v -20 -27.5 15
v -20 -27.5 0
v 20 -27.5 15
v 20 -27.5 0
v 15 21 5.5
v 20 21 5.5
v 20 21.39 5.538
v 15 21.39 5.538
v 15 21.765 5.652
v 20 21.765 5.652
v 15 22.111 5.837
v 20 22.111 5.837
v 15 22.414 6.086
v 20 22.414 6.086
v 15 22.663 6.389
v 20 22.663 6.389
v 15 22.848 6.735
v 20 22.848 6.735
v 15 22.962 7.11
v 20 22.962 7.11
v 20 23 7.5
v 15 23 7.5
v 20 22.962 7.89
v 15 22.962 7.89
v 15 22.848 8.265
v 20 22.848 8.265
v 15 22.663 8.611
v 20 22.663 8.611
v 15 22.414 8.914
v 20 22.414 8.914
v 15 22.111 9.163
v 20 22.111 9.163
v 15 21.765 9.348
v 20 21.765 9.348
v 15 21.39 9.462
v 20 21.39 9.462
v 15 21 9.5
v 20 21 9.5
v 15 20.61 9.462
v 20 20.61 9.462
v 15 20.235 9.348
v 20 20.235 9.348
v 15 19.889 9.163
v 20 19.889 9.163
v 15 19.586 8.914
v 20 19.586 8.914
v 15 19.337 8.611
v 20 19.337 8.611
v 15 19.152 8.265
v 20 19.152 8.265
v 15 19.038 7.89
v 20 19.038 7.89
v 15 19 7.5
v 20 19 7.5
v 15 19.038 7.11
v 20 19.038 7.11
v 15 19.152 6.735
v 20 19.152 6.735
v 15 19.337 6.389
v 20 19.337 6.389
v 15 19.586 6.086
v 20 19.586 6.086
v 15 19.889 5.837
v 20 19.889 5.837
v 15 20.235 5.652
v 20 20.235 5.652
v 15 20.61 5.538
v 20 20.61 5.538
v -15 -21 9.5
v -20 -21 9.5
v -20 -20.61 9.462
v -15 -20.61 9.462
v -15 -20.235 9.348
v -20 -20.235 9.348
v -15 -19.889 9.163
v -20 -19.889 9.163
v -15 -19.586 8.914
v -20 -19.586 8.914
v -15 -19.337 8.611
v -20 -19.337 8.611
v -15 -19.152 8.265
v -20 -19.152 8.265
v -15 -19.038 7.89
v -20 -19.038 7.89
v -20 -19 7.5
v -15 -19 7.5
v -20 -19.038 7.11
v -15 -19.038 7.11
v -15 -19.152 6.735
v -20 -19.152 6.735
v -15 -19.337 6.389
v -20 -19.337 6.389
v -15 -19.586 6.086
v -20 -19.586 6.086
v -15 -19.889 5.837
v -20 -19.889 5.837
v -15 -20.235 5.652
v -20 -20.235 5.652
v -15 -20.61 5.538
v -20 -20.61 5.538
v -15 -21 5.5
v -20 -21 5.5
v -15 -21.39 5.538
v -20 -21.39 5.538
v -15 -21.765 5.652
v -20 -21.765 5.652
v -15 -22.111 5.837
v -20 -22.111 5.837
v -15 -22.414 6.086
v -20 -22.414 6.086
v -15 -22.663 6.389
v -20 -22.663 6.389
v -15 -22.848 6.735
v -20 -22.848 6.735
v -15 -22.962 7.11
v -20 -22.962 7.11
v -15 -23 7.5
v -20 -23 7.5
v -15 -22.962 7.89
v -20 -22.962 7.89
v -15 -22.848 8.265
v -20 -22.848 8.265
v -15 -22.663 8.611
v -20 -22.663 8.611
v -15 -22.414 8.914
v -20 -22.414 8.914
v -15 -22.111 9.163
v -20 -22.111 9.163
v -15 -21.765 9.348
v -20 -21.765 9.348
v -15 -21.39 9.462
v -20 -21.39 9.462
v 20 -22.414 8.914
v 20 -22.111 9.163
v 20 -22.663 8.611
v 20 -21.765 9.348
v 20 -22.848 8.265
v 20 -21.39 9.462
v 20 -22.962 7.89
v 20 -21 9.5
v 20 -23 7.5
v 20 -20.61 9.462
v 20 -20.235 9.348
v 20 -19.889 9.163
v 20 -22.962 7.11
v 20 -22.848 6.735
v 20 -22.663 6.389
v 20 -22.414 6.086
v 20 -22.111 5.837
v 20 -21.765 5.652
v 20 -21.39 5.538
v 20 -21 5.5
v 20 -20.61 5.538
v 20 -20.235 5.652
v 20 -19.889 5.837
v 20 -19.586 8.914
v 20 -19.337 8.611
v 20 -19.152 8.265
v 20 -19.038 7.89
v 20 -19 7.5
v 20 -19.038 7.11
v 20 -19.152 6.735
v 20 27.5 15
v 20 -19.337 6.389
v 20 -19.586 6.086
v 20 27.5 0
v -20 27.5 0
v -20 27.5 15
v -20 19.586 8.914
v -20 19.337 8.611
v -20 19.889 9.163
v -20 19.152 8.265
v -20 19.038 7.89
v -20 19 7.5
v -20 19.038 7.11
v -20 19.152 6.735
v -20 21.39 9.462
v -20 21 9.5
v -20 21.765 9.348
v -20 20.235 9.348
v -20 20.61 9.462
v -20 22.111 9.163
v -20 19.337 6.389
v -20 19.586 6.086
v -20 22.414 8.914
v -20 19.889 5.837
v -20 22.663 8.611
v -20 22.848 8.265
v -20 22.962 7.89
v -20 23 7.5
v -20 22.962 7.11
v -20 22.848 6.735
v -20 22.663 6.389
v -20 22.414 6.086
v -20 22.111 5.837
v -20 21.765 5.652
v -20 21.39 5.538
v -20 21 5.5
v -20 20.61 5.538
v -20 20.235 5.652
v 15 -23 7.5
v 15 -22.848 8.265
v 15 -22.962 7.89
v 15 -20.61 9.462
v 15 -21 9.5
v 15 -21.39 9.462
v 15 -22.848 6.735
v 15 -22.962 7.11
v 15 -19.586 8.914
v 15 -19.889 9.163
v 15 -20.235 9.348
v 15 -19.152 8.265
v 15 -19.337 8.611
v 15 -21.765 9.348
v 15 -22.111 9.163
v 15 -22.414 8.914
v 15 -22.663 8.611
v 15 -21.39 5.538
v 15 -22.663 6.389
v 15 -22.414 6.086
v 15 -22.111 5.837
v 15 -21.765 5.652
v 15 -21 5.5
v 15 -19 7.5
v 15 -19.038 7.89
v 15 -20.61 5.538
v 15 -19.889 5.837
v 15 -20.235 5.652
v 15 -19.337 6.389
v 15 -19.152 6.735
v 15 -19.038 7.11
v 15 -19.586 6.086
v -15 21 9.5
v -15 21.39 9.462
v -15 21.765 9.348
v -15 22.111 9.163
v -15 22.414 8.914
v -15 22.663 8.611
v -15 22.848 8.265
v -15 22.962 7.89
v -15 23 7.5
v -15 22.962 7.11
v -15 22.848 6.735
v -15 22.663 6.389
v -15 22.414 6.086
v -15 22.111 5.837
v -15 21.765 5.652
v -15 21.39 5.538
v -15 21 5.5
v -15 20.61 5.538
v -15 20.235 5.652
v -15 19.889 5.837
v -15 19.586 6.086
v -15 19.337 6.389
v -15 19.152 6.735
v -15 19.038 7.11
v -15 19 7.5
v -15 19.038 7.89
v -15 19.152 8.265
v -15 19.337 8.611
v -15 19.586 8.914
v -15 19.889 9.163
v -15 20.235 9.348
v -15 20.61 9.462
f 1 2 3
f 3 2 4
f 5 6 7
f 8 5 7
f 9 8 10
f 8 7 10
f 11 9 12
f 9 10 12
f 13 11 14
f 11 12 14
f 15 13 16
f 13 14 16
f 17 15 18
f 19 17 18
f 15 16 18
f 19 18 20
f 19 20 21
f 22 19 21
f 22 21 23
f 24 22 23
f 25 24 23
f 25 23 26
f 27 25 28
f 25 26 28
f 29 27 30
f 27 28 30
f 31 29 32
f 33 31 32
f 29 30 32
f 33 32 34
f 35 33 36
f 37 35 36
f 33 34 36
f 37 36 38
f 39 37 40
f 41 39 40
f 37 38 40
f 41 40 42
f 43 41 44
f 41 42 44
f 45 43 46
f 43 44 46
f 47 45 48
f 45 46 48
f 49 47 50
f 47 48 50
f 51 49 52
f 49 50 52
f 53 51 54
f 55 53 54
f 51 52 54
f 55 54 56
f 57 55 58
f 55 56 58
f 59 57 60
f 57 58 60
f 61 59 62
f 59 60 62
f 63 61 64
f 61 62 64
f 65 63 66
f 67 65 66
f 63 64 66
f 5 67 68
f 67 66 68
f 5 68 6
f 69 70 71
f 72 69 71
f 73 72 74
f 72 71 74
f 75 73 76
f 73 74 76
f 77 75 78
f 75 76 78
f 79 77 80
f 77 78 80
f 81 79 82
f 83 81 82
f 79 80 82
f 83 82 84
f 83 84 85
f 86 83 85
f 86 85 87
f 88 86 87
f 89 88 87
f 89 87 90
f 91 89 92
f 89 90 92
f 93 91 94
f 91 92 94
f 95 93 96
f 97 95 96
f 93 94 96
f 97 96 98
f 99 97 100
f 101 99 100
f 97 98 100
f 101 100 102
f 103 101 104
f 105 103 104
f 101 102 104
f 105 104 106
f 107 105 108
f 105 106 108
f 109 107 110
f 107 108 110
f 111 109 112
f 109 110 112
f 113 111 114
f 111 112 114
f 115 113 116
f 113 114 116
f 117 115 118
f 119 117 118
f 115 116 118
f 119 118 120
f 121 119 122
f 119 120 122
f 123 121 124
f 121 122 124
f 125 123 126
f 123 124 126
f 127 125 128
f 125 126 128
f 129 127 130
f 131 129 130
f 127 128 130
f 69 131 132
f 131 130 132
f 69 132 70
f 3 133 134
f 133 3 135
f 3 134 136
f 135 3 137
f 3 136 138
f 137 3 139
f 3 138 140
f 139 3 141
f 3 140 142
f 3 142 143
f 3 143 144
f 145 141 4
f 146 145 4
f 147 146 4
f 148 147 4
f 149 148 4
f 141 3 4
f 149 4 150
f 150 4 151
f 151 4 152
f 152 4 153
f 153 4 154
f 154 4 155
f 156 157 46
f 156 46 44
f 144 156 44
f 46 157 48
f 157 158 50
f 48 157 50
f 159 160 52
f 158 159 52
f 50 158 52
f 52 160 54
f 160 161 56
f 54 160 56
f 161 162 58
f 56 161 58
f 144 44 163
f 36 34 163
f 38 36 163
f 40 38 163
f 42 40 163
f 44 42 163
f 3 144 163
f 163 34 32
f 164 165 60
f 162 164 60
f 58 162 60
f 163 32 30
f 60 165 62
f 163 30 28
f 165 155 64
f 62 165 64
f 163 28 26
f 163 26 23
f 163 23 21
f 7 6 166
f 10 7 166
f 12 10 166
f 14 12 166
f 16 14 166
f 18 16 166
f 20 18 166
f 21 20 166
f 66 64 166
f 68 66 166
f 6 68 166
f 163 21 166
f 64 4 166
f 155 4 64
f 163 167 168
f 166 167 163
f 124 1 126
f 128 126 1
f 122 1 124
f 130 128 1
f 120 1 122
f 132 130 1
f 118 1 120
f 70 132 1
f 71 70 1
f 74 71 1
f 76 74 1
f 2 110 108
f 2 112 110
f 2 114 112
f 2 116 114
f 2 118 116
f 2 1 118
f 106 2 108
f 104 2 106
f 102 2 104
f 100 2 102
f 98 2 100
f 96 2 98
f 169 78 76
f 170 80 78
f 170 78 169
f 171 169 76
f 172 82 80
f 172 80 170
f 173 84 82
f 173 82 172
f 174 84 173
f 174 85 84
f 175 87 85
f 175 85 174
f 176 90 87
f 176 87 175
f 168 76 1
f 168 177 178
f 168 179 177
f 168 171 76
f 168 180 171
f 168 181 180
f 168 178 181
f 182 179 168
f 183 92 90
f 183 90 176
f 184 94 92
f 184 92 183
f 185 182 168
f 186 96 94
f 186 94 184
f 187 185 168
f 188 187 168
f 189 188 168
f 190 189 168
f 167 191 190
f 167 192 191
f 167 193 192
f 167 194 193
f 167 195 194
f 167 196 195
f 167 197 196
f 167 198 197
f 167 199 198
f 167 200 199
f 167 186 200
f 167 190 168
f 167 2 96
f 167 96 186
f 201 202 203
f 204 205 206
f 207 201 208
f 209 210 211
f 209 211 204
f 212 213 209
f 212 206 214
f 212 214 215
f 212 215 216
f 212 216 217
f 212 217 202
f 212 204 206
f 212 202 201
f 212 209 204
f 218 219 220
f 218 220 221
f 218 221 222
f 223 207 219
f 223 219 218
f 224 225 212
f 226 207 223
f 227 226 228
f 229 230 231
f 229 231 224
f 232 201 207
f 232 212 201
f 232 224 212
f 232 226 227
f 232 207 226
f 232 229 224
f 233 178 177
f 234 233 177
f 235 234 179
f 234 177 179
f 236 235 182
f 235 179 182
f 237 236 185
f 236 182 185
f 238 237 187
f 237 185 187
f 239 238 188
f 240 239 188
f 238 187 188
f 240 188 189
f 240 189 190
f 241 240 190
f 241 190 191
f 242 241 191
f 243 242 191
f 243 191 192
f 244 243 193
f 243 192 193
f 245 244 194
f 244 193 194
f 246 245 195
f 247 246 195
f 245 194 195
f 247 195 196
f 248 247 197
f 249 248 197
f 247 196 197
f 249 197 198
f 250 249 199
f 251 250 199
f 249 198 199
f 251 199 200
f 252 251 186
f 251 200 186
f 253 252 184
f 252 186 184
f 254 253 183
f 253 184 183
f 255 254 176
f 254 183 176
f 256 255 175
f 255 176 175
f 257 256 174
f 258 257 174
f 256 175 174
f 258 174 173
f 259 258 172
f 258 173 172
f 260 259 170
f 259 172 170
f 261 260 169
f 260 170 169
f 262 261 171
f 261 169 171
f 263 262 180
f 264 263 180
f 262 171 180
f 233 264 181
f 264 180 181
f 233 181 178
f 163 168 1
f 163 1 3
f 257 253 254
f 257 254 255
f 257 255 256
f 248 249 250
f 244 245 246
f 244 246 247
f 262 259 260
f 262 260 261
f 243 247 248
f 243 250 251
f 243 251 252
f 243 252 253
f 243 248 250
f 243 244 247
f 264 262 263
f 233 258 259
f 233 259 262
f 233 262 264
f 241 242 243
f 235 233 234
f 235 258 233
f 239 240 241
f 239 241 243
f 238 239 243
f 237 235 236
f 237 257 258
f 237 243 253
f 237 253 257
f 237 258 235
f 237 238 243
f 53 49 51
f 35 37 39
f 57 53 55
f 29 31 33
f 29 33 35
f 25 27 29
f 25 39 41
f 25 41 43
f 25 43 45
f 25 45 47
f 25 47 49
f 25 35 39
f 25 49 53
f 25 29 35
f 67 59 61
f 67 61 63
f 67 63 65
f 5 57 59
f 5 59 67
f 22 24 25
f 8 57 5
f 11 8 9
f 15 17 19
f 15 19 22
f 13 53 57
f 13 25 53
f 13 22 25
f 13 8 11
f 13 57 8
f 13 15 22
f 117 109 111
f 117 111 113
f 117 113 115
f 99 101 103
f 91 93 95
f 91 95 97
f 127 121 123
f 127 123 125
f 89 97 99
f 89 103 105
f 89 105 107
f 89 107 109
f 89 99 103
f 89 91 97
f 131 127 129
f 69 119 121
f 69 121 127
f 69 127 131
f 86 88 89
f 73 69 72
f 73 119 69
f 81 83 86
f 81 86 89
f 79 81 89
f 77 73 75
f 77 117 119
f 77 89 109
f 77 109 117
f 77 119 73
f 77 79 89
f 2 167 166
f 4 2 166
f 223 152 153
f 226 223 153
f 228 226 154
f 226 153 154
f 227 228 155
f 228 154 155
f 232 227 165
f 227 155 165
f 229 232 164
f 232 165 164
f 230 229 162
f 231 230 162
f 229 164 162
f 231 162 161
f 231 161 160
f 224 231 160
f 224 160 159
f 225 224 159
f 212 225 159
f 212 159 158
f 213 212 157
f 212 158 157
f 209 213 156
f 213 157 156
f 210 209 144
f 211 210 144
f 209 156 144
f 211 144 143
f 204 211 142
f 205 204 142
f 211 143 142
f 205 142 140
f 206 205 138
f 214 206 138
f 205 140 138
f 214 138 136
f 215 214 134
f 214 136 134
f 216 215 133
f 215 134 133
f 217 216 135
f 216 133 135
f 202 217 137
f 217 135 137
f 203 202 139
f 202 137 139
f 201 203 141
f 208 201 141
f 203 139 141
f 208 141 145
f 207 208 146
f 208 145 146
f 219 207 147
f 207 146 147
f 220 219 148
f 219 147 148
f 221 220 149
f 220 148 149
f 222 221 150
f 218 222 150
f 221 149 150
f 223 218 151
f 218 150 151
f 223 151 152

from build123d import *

# Parameters (mm, degrees)
ESQUISSE1_W             = 40
ESQUISSE1_H             = 55
BOSS_EXTRU_1_DEPTH      = 15
ESQUISSE2_R             = 2
ENL_V_MAT_EXTRU_1_DEPTH = 5
ESQUISSE3_R             = 2
ENL_V_MAT_EXTRU_2_DEPTH = 5


with BuildPart() as part:
    # Esquisse1 → Boss.-Extru.1 (new body)
    with BuildSketch(Plane.XY):
        Rectangle(ESQUISSE1_W, ESQUISSE1_H)
    extrude(amount=BOSS_EXTRU_1_DEPTH)

    # Esquisse2 → Enlèv. mat.-Extru.1 (cut)
    with BuildSketch(Plane(origin=(20, 0, 0), x_dir=(0, 0, -1), z_dir=(1, 0, 0))):
        with Locations((-7.5, 21)):
            Circle(ESQUISSE2_R)
        with Locations((-7.5, -21)):
            Circle(ESQUISSE2_R)
    extrude(amount=-ENL_V_MAT_EXTRU_1_DEPTH, mode=Mode.SUBTRACT)

    # Esquisse3 → Enlèv. mat.-Extru.2 (cut)
    with BuildSketch(Plane.ZY.offset(20)):
        with Locations((7.5, 21)):
            Circle(ESQUISSE3_R)
        with Locations((7.5, -21)):
            Circle(ESQUISSE3_R)
    extrude(amount=-ENL_V_MAT_EXTRU_2_DEPTH, mode=Mode.SUBTRACT)


solid = part.part
